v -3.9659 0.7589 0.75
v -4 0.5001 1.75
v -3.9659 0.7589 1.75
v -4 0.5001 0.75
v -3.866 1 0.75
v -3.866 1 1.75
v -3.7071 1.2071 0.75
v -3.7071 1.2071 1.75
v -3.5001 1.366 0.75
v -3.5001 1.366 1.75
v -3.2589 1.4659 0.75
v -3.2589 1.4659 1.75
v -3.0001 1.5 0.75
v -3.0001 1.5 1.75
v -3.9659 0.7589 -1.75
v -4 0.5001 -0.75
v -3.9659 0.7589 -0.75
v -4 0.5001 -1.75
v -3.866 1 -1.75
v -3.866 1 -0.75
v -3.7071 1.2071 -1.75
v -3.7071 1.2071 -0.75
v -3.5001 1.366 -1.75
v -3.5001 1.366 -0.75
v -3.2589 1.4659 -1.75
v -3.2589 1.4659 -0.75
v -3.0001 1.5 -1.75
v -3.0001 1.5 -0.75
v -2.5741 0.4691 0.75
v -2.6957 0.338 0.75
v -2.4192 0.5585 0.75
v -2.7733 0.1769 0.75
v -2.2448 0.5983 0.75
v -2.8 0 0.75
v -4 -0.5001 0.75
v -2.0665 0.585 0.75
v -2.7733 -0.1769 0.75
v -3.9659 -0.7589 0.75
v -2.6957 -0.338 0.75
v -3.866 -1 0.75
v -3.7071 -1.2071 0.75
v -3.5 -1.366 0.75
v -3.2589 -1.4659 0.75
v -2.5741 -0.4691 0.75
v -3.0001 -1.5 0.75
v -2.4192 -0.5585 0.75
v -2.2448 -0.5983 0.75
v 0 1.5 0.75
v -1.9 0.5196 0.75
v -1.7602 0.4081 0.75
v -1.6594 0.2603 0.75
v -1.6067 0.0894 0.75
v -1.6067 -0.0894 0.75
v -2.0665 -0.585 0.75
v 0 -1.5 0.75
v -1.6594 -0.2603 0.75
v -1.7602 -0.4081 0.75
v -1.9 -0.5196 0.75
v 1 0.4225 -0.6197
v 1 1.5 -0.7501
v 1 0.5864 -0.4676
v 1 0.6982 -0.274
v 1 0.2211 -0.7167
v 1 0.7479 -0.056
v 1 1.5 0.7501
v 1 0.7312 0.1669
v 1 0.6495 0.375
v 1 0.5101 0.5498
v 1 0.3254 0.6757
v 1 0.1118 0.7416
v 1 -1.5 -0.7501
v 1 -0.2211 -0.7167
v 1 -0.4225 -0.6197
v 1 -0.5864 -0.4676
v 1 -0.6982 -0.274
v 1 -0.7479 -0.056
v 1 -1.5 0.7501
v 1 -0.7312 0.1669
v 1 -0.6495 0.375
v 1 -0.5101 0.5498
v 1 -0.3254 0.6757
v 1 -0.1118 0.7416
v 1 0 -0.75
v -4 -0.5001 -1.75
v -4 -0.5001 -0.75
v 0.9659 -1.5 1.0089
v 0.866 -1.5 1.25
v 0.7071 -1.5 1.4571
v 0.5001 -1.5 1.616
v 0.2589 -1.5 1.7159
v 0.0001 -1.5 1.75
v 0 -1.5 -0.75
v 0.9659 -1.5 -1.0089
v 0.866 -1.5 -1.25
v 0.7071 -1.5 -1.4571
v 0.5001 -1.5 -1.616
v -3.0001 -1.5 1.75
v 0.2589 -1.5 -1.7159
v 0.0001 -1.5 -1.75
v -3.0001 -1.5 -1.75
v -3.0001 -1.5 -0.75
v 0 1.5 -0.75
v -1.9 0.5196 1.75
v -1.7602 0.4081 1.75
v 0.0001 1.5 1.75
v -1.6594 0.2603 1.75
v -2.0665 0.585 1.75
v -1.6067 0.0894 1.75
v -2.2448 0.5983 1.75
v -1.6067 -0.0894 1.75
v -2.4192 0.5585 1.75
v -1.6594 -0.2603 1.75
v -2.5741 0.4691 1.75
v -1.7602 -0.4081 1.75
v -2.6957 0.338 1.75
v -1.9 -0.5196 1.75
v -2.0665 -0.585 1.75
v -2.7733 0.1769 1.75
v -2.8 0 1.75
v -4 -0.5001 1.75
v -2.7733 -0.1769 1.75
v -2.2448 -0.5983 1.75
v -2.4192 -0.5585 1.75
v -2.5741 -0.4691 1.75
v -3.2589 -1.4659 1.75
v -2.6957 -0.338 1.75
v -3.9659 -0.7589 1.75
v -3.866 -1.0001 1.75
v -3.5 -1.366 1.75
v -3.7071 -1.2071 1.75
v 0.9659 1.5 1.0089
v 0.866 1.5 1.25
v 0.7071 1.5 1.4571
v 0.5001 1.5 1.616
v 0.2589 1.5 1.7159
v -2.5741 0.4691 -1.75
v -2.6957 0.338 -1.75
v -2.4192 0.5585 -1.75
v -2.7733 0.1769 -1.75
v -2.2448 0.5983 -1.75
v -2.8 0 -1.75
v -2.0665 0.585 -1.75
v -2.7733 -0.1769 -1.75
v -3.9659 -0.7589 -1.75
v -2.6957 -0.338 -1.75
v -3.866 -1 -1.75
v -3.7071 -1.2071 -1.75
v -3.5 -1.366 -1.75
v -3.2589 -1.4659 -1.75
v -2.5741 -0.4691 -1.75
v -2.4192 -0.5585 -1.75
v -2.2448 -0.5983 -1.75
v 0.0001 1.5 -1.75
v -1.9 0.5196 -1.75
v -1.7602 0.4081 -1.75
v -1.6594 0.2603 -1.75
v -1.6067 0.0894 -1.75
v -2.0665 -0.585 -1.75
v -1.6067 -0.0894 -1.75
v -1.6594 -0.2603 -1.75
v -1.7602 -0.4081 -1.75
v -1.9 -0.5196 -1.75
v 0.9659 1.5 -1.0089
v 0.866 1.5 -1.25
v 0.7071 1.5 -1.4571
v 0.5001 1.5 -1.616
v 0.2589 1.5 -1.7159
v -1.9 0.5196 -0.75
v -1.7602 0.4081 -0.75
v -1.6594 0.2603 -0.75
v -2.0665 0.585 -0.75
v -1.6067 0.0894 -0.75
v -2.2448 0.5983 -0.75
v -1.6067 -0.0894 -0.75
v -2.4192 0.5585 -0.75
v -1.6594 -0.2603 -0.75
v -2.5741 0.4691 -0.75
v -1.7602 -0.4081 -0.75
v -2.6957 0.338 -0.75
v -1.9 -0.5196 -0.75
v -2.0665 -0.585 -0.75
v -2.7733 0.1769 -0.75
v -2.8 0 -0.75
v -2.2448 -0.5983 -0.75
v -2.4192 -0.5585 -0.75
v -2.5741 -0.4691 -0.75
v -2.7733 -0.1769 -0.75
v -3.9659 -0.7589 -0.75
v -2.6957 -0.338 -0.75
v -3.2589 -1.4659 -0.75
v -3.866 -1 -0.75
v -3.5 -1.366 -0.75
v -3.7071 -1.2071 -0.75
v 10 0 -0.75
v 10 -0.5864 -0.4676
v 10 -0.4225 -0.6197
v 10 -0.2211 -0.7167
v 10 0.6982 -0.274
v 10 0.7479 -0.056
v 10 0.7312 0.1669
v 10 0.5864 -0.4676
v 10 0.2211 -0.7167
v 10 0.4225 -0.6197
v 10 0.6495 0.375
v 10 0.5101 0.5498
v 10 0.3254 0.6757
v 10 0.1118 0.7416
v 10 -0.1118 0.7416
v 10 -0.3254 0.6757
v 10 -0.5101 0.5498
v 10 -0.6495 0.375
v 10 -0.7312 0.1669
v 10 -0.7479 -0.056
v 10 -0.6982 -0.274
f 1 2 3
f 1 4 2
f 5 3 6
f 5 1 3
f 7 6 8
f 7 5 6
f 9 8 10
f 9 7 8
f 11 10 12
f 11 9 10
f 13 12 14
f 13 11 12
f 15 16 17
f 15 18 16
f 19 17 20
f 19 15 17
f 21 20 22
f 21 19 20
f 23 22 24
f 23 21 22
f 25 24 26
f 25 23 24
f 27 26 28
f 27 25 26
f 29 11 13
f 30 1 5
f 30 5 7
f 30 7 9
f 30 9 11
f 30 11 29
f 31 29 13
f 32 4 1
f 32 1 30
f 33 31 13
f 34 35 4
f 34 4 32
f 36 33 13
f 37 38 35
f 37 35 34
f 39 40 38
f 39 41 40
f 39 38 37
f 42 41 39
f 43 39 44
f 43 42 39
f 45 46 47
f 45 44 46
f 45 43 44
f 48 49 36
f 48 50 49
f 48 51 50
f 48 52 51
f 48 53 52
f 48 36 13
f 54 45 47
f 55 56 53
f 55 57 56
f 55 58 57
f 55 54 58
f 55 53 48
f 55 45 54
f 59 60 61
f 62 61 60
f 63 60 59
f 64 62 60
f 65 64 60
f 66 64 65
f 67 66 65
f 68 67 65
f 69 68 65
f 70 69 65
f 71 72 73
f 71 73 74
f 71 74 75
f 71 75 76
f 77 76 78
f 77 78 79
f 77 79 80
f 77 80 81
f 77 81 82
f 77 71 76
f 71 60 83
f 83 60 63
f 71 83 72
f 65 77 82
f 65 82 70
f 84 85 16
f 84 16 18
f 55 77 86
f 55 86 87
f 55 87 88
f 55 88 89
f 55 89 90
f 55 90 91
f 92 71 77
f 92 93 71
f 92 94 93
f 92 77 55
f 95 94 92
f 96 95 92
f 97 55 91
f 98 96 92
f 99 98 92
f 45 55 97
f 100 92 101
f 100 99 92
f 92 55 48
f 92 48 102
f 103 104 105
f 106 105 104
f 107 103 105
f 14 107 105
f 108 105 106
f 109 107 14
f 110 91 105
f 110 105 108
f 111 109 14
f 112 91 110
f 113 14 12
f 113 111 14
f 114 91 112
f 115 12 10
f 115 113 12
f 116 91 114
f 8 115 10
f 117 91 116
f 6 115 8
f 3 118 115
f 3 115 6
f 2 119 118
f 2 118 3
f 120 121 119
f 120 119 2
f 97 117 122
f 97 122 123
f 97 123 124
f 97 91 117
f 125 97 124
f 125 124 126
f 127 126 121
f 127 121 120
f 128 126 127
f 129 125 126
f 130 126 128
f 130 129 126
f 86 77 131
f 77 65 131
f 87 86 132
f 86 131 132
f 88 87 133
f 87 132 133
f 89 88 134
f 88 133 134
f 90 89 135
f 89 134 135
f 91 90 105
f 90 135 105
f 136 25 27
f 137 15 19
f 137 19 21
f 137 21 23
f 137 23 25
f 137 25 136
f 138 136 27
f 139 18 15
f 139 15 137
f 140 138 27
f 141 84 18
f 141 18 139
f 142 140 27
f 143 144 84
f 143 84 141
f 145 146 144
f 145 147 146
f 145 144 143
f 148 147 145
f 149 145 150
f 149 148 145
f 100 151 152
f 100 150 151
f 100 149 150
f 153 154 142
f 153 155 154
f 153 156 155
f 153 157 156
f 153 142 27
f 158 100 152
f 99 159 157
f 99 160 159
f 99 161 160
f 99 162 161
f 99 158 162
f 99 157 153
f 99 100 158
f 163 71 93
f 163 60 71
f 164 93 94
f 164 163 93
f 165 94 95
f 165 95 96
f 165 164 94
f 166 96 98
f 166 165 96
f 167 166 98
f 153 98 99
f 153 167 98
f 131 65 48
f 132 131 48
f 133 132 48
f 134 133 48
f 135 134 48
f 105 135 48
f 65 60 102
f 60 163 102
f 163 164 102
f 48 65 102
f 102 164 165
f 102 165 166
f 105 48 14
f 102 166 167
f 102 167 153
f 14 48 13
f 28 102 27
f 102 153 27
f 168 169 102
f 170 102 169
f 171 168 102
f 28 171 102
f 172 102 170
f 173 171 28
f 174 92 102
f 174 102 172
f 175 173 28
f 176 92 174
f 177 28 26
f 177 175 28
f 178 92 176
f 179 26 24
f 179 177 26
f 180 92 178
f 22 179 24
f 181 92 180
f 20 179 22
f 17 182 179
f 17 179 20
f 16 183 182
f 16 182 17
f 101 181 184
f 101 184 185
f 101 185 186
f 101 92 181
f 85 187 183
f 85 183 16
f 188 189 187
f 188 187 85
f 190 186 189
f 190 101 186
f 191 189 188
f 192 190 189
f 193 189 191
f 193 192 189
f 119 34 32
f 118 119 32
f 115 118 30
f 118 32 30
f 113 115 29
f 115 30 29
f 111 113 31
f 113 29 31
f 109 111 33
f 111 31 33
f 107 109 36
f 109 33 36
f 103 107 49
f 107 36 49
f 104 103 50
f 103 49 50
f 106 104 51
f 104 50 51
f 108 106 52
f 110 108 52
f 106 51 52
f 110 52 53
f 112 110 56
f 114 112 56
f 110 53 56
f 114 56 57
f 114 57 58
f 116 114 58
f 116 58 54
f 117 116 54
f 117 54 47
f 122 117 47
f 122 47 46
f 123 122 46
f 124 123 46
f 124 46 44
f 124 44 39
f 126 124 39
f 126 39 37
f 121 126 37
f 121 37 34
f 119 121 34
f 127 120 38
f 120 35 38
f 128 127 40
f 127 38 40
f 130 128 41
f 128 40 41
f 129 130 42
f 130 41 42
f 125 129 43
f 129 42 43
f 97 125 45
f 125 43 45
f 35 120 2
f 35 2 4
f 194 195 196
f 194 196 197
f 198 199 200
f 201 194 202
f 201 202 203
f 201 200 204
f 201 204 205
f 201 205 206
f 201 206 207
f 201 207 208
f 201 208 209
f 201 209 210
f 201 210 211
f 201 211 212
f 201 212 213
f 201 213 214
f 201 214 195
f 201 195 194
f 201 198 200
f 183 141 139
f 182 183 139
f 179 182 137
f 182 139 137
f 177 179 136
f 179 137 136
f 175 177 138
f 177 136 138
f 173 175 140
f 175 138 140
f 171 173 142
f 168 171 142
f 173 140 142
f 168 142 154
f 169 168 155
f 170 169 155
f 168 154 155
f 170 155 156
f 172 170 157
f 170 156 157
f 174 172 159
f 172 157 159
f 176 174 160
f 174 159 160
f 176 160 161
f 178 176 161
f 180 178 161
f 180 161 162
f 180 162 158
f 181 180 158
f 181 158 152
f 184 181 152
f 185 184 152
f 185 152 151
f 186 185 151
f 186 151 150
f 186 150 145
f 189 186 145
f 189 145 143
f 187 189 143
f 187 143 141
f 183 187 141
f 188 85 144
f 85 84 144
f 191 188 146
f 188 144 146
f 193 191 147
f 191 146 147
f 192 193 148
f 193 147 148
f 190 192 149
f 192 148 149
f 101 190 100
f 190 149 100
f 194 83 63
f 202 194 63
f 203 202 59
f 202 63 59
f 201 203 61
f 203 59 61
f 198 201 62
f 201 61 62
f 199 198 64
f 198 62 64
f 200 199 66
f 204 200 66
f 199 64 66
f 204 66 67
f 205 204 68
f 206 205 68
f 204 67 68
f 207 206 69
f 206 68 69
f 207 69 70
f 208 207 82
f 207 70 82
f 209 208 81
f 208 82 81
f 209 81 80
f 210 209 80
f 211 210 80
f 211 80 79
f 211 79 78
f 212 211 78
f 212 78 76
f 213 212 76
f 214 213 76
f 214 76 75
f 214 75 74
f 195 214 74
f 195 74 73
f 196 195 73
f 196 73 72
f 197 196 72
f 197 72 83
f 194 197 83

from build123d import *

# Parameters (mm, degrees)
SKETCH1_R                = 0.75
BOSS_EXTRUDE1_DEPTH      = 10
BOSS_EXTRUDE2_DEPTH      = 1.5
BOSS_EXTRUDE2_DEPTH_BACK = 1.5
FILLET1_R                = 1
SKETCH3_R                = 0.6
CUT_EXTRUDE1_DEPTH       = 5


with BuildPart() as part:
    # Sketch1 → Boss-Extrude1 (new body)
    with BuildSketch(Plane(origin=(0, 0, 0), x_dir=(0, 0, -1), z_dir=(1, 0, 0))):
        Circle(SKETCH1_R)
    extrude(amount=BOSS_EXTRUDE1_DEPTH)

    # Sketch2 → Boss-Extrude2 (add, two sides: drawn at the far end of the back side and taken through both)
    with BuildSketch(Plane(origin=(0, 0, 0), x_dir=(1, 0, 0), z_dir=(0, 1, 0)).offset(-BOSS_EXTRUDE2_DEPTH_BACK)):
        Polygon((1, 1.75), (1, -1.75), (-4, -1.75), (-4, -0.75), (0, -0.75), (0, 0.75), (-4, 0.75), (-4, 1.75), align=None)
    extrude(amount=BOSS_EXTRUDE2_DEPTH + BOSS_EXTRUDE2_DEPTH_BACK)

    # Fillet1
    fillet1_edges = [part.edges().sort_by_distance(p)[0] for p in [
        (-4, 1.5, 1.25),
        (-4, 1.5, -1.25),
        (-4, -1.5, -1.25),
        (1, 0, -1.75),
        (1, 0, 1.75),
        (-4, -1.5, 1.25),
    ]]
    fillet(fillet1_edges, radius=FILLET1_R - 0.0001)  # a hair under: the kernel refuses the full size

    # Sketch3 → Cut-Extrude1 (cut)
    with BuildSketch(Plane(origin=(0, 0, -1.75), x_dir=(-1, 0, 0), z_dir=(0, 0, -1))):
        with Locations((2.2, 0)):
            Circle(SKETCH3_R)
    extrude(amount=-CUT_EXTRUDE1_DEPTH, mode=Mode.SUBTRACT)


solid = part.part
